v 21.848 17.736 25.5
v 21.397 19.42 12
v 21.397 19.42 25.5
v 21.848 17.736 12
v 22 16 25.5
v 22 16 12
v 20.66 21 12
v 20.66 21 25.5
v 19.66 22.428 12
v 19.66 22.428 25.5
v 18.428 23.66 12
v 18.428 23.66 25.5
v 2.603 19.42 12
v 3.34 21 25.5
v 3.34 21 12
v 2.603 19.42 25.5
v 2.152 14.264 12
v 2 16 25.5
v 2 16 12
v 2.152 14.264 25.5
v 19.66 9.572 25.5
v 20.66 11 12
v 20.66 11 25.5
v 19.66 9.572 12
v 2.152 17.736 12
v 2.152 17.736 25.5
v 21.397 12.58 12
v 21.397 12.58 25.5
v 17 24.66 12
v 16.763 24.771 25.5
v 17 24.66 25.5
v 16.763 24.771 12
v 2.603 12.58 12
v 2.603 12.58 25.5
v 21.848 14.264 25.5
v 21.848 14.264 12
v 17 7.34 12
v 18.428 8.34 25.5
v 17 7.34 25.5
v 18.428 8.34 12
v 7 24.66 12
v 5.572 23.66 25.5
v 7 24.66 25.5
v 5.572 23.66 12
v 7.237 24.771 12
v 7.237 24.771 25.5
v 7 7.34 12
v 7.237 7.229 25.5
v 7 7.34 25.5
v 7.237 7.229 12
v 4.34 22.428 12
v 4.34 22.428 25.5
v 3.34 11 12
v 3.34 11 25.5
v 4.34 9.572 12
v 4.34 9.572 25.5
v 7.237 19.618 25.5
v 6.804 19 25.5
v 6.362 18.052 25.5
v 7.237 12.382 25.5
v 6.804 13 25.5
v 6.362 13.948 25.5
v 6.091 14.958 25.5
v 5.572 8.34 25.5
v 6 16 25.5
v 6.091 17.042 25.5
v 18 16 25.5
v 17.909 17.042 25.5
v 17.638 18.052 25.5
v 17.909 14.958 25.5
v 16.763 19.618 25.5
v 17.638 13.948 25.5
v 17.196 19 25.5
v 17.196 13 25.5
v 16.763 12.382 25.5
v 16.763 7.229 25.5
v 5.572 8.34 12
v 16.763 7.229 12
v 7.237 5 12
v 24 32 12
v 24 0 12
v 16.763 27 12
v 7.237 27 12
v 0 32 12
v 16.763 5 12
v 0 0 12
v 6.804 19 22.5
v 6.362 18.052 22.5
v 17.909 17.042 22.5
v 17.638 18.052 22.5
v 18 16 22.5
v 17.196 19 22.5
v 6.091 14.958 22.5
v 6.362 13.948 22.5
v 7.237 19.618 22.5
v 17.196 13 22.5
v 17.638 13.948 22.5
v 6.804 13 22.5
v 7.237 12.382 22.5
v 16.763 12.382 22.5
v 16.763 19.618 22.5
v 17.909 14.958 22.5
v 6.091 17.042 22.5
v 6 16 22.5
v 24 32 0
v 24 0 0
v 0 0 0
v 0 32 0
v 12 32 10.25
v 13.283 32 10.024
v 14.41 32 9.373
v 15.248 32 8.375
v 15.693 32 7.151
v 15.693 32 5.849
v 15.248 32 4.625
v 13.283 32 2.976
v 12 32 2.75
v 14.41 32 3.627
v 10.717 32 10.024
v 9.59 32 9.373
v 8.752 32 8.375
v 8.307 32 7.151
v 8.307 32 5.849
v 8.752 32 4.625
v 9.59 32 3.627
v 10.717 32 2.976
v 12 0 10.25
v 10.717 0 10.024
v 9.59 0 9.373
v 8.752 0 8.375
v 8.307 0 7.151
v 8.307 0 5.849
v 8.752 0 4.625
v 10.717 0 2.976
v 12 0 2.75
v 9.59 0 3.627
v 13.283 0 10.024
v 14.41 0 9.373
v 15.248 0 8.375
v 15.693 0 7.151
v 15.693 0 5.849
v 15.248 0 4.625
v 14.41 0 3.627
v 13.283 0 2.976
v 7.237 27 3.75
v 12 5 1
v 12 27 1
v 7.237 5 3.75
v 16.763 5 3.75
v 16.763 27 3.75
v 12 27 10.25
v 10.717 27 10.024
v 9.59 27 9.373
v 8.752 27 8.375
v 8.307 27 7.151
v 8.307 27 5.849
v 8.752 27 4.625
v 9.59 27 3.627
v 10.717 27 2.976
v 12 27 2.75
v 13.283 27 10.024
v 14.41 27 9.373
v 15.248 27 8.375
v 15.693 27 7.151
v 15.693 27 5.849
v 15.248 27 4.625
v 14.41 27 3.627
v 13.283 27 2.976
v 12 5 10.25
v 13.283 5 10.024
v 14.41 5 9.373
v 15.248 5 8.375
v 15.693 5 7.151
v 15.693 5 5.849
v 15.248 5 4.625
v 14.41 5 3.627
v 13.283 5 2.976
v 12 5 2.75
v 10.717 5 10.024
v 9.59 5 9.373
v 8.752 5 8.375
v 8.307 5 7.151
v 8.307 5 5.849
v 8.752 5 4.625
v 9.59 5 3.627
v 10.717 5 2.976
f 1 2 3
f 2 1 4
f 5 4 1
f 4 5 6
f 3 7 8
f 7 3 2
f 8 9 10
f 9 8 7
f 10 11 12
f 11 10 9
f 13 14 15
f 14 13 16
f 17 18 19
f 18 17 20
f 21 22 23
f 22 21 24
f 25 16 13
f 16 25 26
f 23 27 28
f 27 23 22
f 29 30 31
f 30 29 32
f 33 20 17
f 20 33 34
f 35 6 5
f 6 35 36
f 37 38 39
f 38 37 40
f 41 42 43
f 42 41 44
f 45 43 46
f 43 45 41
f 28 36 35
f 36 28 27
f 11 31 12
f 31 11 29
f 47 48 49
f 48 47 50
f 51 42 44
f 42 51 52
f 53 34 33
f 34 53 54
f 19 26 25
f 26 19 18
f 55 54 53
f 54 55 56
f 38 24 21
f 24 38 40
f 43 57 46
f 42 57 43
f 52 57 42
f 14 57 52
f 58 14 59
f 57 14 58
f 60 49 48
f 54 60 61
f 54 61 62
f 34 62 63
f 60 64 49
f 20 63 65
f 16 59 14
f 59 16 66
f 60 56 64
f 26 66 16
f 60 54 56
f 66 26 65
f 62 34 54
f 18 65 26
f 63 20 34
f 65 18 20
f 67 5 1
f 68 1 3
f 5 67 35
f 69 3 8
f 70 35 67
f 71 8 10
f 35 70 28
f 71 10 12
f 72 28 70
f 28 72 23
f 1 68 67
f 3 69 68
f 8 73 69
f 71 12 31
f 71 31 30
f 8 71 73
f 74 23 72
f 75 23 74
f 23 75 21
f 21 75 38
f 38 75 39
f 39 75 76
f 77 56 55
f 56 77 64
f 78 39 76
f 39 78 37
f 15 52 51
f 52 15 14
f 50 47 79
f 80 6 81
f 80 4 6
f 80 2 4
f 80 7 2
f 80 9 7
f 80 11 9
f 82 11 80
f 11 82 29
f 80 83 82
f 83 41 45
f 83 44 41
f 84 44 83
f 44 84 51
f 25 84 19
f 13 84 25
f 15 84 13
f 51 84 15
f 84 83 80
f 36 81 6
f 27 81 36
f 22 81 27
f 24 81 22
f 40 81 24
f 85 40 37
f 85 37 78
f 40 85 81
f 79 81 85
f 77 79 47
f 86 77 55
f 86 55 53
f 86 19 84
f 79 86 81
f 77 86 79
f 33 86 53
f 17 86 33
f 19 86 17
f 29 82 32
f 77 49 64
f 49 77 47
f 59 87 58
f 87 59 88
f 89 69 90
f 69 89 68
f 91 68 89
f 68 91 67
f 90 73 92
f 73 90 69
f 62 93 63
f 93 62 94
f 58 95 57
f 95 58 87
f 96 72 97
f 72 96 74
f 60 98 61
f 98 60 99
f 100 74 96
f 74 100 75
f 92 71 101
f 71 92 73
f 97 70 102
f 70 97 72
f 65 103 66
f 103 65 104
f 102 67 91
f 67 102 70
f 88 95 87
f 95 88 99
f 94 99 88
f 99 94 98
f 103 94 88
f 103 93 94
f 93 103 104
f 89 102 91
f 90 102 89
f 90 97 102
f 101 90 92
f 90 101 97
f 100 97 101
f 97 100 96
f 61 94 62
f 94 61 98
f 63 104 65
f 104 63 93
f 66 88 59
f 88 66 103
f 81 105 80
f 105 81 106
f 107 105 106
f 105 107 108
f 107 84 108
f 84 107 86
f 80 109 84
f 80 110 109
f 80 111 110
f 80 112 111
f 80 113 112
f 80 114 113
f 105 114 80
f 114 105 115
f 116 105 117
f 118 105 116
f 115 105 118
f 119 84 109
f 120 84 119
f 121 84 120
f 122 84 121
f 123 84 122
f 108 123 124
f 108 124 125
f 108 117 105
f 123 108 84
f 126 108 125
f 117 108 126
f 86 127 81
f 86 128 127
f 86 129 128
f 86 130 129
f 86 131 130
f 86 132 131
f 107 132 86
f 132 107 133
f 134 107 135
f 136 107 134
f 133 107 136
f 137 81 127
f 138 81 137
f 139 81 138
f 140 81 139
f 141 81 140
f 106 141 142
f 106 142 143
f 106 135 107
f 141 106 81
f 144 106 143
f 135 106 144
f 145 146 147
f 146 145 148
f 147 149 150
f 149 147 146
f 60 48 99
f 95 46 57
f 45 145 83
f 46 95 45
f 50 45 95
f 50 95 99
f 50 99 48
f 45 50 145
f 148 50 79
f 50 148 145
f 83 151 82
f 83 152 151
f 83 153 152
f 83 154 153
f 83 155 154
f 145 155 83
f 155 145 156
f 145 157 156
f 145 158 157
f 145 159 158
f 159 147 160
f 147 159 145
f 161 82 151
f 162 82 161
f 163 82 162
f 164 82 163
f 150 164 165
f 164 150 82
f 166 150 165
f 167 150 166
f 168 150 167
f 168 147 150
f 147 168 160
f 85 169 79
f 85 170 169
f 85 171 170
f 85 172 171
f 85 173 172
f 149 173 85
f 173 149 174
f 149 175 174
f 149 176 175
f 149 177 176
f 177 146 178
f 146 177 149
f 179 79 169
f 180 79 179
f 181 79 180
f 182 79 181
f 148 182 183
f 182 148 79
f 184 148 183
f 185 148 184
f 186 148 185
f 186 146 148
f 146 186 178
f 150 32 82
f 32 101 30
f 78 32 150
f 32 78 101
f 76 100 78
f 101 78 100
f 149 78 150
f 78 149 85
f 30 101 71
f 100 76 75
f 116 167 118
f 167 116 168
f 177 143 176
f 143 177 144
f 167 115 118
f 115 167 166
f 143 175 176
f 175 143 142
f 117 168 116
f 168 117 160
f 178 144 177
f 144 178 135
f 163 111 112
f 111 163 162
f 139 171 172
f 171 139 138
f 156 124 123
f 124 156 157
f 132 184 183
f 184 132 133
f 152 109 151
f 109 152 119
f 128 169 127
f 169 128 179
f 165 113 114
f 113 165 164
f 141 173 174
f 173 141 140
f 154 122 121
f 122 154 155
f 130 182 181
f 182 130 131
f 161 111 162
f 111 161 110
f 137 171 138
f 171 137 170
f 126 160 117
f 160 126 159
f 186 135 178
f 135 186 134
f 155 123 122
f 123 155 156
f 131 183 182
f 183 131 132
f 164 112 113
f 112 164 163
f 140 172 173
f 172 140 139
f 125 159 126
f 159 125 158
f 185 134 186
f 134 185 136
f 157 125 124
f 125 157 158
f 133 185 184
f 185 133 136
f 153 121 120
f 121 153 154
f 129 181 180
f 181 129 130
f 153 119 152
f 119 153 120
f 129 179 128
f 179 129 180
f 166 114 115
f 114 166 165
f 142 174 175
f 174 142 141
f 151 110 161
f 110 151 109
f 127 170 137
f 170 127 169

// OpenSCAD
nut_radius = 5.5;
nut_length = 22;
nut_small_dia = 9.5;
nut_center_radius = 3.75;

end_padding = 5;
bottom_padding = 1;

base_width = 24;
base_length = nut_length + (2*end_padding);
base_thickness = bottom_padding + (2*nut_radius);

motor_h = 40;
top_clearance = motor_h/2;

patin_r = (motor_h/2)-(nut_radius);
patin_h = 3;

magnet_r = 6;
magnet_h = 3;
magnet_wall = 4;
magnet_top_clearance = 1;

module patin()
{
	difference()
	{
		cylinder(r=patin_r, h=patin_h);

		translate([0,-1*patin_r,0])
			cube([patin_r,2*patin_r,patin_h]);
	}
}

module magnet()
{
	difference()
	{
		cylinder(r=magnet_r+magnet_wall, h=patin_r-magnet_top_clearance, $fn=36);

		translate([0, 0, patin_r-magnet_h-magnet_top_clearance])
			cylinder(r=magnet_r, h=magnet_h, $fn=36);
	}
}

module base()
{
	union()
	{
		cube([base_width, base_length, base_thickness]);

		translate([base_width/2,base_length/2,base_thickness ])
			magnet();

		/*
		translate([0, base_length/2, base_thickness])
			rotate(a=90, v=[0,1,0])
				patin();

		translate([base_width-patin_h, base_length/2, base_thickness])
			rotate(a=90, v=[0,1,0])
				patin();
		*/
	}
}

module linear_nut()
{
	difference()
	{
		base();

		for(i=[1:5])
		{
			// The following 3 cylinters are the housing of the hex nut
			translate([base_width/2,end_padding,i*nut_radius+bottom_padding])
				rotate(a=-90, v=[1,0,0])
					rotate(a=30, v=[0,0,1])
						cylinder(r=nut_radius, h=nut_length, $fn=6);
		}

		// Hole for the 1/4 filted rod
		translate([base_width/2,-1*end_padding/2,nut_radius+bottom_padding])
			rotate(a=-90, v=[1,0,0])
				rotate(a=30, v=[0,0,1])
					cylinder(r=nut_center_radius, h=base_length+end_padding, $fn=18);
	}
}

linear_nut();
//patin();
